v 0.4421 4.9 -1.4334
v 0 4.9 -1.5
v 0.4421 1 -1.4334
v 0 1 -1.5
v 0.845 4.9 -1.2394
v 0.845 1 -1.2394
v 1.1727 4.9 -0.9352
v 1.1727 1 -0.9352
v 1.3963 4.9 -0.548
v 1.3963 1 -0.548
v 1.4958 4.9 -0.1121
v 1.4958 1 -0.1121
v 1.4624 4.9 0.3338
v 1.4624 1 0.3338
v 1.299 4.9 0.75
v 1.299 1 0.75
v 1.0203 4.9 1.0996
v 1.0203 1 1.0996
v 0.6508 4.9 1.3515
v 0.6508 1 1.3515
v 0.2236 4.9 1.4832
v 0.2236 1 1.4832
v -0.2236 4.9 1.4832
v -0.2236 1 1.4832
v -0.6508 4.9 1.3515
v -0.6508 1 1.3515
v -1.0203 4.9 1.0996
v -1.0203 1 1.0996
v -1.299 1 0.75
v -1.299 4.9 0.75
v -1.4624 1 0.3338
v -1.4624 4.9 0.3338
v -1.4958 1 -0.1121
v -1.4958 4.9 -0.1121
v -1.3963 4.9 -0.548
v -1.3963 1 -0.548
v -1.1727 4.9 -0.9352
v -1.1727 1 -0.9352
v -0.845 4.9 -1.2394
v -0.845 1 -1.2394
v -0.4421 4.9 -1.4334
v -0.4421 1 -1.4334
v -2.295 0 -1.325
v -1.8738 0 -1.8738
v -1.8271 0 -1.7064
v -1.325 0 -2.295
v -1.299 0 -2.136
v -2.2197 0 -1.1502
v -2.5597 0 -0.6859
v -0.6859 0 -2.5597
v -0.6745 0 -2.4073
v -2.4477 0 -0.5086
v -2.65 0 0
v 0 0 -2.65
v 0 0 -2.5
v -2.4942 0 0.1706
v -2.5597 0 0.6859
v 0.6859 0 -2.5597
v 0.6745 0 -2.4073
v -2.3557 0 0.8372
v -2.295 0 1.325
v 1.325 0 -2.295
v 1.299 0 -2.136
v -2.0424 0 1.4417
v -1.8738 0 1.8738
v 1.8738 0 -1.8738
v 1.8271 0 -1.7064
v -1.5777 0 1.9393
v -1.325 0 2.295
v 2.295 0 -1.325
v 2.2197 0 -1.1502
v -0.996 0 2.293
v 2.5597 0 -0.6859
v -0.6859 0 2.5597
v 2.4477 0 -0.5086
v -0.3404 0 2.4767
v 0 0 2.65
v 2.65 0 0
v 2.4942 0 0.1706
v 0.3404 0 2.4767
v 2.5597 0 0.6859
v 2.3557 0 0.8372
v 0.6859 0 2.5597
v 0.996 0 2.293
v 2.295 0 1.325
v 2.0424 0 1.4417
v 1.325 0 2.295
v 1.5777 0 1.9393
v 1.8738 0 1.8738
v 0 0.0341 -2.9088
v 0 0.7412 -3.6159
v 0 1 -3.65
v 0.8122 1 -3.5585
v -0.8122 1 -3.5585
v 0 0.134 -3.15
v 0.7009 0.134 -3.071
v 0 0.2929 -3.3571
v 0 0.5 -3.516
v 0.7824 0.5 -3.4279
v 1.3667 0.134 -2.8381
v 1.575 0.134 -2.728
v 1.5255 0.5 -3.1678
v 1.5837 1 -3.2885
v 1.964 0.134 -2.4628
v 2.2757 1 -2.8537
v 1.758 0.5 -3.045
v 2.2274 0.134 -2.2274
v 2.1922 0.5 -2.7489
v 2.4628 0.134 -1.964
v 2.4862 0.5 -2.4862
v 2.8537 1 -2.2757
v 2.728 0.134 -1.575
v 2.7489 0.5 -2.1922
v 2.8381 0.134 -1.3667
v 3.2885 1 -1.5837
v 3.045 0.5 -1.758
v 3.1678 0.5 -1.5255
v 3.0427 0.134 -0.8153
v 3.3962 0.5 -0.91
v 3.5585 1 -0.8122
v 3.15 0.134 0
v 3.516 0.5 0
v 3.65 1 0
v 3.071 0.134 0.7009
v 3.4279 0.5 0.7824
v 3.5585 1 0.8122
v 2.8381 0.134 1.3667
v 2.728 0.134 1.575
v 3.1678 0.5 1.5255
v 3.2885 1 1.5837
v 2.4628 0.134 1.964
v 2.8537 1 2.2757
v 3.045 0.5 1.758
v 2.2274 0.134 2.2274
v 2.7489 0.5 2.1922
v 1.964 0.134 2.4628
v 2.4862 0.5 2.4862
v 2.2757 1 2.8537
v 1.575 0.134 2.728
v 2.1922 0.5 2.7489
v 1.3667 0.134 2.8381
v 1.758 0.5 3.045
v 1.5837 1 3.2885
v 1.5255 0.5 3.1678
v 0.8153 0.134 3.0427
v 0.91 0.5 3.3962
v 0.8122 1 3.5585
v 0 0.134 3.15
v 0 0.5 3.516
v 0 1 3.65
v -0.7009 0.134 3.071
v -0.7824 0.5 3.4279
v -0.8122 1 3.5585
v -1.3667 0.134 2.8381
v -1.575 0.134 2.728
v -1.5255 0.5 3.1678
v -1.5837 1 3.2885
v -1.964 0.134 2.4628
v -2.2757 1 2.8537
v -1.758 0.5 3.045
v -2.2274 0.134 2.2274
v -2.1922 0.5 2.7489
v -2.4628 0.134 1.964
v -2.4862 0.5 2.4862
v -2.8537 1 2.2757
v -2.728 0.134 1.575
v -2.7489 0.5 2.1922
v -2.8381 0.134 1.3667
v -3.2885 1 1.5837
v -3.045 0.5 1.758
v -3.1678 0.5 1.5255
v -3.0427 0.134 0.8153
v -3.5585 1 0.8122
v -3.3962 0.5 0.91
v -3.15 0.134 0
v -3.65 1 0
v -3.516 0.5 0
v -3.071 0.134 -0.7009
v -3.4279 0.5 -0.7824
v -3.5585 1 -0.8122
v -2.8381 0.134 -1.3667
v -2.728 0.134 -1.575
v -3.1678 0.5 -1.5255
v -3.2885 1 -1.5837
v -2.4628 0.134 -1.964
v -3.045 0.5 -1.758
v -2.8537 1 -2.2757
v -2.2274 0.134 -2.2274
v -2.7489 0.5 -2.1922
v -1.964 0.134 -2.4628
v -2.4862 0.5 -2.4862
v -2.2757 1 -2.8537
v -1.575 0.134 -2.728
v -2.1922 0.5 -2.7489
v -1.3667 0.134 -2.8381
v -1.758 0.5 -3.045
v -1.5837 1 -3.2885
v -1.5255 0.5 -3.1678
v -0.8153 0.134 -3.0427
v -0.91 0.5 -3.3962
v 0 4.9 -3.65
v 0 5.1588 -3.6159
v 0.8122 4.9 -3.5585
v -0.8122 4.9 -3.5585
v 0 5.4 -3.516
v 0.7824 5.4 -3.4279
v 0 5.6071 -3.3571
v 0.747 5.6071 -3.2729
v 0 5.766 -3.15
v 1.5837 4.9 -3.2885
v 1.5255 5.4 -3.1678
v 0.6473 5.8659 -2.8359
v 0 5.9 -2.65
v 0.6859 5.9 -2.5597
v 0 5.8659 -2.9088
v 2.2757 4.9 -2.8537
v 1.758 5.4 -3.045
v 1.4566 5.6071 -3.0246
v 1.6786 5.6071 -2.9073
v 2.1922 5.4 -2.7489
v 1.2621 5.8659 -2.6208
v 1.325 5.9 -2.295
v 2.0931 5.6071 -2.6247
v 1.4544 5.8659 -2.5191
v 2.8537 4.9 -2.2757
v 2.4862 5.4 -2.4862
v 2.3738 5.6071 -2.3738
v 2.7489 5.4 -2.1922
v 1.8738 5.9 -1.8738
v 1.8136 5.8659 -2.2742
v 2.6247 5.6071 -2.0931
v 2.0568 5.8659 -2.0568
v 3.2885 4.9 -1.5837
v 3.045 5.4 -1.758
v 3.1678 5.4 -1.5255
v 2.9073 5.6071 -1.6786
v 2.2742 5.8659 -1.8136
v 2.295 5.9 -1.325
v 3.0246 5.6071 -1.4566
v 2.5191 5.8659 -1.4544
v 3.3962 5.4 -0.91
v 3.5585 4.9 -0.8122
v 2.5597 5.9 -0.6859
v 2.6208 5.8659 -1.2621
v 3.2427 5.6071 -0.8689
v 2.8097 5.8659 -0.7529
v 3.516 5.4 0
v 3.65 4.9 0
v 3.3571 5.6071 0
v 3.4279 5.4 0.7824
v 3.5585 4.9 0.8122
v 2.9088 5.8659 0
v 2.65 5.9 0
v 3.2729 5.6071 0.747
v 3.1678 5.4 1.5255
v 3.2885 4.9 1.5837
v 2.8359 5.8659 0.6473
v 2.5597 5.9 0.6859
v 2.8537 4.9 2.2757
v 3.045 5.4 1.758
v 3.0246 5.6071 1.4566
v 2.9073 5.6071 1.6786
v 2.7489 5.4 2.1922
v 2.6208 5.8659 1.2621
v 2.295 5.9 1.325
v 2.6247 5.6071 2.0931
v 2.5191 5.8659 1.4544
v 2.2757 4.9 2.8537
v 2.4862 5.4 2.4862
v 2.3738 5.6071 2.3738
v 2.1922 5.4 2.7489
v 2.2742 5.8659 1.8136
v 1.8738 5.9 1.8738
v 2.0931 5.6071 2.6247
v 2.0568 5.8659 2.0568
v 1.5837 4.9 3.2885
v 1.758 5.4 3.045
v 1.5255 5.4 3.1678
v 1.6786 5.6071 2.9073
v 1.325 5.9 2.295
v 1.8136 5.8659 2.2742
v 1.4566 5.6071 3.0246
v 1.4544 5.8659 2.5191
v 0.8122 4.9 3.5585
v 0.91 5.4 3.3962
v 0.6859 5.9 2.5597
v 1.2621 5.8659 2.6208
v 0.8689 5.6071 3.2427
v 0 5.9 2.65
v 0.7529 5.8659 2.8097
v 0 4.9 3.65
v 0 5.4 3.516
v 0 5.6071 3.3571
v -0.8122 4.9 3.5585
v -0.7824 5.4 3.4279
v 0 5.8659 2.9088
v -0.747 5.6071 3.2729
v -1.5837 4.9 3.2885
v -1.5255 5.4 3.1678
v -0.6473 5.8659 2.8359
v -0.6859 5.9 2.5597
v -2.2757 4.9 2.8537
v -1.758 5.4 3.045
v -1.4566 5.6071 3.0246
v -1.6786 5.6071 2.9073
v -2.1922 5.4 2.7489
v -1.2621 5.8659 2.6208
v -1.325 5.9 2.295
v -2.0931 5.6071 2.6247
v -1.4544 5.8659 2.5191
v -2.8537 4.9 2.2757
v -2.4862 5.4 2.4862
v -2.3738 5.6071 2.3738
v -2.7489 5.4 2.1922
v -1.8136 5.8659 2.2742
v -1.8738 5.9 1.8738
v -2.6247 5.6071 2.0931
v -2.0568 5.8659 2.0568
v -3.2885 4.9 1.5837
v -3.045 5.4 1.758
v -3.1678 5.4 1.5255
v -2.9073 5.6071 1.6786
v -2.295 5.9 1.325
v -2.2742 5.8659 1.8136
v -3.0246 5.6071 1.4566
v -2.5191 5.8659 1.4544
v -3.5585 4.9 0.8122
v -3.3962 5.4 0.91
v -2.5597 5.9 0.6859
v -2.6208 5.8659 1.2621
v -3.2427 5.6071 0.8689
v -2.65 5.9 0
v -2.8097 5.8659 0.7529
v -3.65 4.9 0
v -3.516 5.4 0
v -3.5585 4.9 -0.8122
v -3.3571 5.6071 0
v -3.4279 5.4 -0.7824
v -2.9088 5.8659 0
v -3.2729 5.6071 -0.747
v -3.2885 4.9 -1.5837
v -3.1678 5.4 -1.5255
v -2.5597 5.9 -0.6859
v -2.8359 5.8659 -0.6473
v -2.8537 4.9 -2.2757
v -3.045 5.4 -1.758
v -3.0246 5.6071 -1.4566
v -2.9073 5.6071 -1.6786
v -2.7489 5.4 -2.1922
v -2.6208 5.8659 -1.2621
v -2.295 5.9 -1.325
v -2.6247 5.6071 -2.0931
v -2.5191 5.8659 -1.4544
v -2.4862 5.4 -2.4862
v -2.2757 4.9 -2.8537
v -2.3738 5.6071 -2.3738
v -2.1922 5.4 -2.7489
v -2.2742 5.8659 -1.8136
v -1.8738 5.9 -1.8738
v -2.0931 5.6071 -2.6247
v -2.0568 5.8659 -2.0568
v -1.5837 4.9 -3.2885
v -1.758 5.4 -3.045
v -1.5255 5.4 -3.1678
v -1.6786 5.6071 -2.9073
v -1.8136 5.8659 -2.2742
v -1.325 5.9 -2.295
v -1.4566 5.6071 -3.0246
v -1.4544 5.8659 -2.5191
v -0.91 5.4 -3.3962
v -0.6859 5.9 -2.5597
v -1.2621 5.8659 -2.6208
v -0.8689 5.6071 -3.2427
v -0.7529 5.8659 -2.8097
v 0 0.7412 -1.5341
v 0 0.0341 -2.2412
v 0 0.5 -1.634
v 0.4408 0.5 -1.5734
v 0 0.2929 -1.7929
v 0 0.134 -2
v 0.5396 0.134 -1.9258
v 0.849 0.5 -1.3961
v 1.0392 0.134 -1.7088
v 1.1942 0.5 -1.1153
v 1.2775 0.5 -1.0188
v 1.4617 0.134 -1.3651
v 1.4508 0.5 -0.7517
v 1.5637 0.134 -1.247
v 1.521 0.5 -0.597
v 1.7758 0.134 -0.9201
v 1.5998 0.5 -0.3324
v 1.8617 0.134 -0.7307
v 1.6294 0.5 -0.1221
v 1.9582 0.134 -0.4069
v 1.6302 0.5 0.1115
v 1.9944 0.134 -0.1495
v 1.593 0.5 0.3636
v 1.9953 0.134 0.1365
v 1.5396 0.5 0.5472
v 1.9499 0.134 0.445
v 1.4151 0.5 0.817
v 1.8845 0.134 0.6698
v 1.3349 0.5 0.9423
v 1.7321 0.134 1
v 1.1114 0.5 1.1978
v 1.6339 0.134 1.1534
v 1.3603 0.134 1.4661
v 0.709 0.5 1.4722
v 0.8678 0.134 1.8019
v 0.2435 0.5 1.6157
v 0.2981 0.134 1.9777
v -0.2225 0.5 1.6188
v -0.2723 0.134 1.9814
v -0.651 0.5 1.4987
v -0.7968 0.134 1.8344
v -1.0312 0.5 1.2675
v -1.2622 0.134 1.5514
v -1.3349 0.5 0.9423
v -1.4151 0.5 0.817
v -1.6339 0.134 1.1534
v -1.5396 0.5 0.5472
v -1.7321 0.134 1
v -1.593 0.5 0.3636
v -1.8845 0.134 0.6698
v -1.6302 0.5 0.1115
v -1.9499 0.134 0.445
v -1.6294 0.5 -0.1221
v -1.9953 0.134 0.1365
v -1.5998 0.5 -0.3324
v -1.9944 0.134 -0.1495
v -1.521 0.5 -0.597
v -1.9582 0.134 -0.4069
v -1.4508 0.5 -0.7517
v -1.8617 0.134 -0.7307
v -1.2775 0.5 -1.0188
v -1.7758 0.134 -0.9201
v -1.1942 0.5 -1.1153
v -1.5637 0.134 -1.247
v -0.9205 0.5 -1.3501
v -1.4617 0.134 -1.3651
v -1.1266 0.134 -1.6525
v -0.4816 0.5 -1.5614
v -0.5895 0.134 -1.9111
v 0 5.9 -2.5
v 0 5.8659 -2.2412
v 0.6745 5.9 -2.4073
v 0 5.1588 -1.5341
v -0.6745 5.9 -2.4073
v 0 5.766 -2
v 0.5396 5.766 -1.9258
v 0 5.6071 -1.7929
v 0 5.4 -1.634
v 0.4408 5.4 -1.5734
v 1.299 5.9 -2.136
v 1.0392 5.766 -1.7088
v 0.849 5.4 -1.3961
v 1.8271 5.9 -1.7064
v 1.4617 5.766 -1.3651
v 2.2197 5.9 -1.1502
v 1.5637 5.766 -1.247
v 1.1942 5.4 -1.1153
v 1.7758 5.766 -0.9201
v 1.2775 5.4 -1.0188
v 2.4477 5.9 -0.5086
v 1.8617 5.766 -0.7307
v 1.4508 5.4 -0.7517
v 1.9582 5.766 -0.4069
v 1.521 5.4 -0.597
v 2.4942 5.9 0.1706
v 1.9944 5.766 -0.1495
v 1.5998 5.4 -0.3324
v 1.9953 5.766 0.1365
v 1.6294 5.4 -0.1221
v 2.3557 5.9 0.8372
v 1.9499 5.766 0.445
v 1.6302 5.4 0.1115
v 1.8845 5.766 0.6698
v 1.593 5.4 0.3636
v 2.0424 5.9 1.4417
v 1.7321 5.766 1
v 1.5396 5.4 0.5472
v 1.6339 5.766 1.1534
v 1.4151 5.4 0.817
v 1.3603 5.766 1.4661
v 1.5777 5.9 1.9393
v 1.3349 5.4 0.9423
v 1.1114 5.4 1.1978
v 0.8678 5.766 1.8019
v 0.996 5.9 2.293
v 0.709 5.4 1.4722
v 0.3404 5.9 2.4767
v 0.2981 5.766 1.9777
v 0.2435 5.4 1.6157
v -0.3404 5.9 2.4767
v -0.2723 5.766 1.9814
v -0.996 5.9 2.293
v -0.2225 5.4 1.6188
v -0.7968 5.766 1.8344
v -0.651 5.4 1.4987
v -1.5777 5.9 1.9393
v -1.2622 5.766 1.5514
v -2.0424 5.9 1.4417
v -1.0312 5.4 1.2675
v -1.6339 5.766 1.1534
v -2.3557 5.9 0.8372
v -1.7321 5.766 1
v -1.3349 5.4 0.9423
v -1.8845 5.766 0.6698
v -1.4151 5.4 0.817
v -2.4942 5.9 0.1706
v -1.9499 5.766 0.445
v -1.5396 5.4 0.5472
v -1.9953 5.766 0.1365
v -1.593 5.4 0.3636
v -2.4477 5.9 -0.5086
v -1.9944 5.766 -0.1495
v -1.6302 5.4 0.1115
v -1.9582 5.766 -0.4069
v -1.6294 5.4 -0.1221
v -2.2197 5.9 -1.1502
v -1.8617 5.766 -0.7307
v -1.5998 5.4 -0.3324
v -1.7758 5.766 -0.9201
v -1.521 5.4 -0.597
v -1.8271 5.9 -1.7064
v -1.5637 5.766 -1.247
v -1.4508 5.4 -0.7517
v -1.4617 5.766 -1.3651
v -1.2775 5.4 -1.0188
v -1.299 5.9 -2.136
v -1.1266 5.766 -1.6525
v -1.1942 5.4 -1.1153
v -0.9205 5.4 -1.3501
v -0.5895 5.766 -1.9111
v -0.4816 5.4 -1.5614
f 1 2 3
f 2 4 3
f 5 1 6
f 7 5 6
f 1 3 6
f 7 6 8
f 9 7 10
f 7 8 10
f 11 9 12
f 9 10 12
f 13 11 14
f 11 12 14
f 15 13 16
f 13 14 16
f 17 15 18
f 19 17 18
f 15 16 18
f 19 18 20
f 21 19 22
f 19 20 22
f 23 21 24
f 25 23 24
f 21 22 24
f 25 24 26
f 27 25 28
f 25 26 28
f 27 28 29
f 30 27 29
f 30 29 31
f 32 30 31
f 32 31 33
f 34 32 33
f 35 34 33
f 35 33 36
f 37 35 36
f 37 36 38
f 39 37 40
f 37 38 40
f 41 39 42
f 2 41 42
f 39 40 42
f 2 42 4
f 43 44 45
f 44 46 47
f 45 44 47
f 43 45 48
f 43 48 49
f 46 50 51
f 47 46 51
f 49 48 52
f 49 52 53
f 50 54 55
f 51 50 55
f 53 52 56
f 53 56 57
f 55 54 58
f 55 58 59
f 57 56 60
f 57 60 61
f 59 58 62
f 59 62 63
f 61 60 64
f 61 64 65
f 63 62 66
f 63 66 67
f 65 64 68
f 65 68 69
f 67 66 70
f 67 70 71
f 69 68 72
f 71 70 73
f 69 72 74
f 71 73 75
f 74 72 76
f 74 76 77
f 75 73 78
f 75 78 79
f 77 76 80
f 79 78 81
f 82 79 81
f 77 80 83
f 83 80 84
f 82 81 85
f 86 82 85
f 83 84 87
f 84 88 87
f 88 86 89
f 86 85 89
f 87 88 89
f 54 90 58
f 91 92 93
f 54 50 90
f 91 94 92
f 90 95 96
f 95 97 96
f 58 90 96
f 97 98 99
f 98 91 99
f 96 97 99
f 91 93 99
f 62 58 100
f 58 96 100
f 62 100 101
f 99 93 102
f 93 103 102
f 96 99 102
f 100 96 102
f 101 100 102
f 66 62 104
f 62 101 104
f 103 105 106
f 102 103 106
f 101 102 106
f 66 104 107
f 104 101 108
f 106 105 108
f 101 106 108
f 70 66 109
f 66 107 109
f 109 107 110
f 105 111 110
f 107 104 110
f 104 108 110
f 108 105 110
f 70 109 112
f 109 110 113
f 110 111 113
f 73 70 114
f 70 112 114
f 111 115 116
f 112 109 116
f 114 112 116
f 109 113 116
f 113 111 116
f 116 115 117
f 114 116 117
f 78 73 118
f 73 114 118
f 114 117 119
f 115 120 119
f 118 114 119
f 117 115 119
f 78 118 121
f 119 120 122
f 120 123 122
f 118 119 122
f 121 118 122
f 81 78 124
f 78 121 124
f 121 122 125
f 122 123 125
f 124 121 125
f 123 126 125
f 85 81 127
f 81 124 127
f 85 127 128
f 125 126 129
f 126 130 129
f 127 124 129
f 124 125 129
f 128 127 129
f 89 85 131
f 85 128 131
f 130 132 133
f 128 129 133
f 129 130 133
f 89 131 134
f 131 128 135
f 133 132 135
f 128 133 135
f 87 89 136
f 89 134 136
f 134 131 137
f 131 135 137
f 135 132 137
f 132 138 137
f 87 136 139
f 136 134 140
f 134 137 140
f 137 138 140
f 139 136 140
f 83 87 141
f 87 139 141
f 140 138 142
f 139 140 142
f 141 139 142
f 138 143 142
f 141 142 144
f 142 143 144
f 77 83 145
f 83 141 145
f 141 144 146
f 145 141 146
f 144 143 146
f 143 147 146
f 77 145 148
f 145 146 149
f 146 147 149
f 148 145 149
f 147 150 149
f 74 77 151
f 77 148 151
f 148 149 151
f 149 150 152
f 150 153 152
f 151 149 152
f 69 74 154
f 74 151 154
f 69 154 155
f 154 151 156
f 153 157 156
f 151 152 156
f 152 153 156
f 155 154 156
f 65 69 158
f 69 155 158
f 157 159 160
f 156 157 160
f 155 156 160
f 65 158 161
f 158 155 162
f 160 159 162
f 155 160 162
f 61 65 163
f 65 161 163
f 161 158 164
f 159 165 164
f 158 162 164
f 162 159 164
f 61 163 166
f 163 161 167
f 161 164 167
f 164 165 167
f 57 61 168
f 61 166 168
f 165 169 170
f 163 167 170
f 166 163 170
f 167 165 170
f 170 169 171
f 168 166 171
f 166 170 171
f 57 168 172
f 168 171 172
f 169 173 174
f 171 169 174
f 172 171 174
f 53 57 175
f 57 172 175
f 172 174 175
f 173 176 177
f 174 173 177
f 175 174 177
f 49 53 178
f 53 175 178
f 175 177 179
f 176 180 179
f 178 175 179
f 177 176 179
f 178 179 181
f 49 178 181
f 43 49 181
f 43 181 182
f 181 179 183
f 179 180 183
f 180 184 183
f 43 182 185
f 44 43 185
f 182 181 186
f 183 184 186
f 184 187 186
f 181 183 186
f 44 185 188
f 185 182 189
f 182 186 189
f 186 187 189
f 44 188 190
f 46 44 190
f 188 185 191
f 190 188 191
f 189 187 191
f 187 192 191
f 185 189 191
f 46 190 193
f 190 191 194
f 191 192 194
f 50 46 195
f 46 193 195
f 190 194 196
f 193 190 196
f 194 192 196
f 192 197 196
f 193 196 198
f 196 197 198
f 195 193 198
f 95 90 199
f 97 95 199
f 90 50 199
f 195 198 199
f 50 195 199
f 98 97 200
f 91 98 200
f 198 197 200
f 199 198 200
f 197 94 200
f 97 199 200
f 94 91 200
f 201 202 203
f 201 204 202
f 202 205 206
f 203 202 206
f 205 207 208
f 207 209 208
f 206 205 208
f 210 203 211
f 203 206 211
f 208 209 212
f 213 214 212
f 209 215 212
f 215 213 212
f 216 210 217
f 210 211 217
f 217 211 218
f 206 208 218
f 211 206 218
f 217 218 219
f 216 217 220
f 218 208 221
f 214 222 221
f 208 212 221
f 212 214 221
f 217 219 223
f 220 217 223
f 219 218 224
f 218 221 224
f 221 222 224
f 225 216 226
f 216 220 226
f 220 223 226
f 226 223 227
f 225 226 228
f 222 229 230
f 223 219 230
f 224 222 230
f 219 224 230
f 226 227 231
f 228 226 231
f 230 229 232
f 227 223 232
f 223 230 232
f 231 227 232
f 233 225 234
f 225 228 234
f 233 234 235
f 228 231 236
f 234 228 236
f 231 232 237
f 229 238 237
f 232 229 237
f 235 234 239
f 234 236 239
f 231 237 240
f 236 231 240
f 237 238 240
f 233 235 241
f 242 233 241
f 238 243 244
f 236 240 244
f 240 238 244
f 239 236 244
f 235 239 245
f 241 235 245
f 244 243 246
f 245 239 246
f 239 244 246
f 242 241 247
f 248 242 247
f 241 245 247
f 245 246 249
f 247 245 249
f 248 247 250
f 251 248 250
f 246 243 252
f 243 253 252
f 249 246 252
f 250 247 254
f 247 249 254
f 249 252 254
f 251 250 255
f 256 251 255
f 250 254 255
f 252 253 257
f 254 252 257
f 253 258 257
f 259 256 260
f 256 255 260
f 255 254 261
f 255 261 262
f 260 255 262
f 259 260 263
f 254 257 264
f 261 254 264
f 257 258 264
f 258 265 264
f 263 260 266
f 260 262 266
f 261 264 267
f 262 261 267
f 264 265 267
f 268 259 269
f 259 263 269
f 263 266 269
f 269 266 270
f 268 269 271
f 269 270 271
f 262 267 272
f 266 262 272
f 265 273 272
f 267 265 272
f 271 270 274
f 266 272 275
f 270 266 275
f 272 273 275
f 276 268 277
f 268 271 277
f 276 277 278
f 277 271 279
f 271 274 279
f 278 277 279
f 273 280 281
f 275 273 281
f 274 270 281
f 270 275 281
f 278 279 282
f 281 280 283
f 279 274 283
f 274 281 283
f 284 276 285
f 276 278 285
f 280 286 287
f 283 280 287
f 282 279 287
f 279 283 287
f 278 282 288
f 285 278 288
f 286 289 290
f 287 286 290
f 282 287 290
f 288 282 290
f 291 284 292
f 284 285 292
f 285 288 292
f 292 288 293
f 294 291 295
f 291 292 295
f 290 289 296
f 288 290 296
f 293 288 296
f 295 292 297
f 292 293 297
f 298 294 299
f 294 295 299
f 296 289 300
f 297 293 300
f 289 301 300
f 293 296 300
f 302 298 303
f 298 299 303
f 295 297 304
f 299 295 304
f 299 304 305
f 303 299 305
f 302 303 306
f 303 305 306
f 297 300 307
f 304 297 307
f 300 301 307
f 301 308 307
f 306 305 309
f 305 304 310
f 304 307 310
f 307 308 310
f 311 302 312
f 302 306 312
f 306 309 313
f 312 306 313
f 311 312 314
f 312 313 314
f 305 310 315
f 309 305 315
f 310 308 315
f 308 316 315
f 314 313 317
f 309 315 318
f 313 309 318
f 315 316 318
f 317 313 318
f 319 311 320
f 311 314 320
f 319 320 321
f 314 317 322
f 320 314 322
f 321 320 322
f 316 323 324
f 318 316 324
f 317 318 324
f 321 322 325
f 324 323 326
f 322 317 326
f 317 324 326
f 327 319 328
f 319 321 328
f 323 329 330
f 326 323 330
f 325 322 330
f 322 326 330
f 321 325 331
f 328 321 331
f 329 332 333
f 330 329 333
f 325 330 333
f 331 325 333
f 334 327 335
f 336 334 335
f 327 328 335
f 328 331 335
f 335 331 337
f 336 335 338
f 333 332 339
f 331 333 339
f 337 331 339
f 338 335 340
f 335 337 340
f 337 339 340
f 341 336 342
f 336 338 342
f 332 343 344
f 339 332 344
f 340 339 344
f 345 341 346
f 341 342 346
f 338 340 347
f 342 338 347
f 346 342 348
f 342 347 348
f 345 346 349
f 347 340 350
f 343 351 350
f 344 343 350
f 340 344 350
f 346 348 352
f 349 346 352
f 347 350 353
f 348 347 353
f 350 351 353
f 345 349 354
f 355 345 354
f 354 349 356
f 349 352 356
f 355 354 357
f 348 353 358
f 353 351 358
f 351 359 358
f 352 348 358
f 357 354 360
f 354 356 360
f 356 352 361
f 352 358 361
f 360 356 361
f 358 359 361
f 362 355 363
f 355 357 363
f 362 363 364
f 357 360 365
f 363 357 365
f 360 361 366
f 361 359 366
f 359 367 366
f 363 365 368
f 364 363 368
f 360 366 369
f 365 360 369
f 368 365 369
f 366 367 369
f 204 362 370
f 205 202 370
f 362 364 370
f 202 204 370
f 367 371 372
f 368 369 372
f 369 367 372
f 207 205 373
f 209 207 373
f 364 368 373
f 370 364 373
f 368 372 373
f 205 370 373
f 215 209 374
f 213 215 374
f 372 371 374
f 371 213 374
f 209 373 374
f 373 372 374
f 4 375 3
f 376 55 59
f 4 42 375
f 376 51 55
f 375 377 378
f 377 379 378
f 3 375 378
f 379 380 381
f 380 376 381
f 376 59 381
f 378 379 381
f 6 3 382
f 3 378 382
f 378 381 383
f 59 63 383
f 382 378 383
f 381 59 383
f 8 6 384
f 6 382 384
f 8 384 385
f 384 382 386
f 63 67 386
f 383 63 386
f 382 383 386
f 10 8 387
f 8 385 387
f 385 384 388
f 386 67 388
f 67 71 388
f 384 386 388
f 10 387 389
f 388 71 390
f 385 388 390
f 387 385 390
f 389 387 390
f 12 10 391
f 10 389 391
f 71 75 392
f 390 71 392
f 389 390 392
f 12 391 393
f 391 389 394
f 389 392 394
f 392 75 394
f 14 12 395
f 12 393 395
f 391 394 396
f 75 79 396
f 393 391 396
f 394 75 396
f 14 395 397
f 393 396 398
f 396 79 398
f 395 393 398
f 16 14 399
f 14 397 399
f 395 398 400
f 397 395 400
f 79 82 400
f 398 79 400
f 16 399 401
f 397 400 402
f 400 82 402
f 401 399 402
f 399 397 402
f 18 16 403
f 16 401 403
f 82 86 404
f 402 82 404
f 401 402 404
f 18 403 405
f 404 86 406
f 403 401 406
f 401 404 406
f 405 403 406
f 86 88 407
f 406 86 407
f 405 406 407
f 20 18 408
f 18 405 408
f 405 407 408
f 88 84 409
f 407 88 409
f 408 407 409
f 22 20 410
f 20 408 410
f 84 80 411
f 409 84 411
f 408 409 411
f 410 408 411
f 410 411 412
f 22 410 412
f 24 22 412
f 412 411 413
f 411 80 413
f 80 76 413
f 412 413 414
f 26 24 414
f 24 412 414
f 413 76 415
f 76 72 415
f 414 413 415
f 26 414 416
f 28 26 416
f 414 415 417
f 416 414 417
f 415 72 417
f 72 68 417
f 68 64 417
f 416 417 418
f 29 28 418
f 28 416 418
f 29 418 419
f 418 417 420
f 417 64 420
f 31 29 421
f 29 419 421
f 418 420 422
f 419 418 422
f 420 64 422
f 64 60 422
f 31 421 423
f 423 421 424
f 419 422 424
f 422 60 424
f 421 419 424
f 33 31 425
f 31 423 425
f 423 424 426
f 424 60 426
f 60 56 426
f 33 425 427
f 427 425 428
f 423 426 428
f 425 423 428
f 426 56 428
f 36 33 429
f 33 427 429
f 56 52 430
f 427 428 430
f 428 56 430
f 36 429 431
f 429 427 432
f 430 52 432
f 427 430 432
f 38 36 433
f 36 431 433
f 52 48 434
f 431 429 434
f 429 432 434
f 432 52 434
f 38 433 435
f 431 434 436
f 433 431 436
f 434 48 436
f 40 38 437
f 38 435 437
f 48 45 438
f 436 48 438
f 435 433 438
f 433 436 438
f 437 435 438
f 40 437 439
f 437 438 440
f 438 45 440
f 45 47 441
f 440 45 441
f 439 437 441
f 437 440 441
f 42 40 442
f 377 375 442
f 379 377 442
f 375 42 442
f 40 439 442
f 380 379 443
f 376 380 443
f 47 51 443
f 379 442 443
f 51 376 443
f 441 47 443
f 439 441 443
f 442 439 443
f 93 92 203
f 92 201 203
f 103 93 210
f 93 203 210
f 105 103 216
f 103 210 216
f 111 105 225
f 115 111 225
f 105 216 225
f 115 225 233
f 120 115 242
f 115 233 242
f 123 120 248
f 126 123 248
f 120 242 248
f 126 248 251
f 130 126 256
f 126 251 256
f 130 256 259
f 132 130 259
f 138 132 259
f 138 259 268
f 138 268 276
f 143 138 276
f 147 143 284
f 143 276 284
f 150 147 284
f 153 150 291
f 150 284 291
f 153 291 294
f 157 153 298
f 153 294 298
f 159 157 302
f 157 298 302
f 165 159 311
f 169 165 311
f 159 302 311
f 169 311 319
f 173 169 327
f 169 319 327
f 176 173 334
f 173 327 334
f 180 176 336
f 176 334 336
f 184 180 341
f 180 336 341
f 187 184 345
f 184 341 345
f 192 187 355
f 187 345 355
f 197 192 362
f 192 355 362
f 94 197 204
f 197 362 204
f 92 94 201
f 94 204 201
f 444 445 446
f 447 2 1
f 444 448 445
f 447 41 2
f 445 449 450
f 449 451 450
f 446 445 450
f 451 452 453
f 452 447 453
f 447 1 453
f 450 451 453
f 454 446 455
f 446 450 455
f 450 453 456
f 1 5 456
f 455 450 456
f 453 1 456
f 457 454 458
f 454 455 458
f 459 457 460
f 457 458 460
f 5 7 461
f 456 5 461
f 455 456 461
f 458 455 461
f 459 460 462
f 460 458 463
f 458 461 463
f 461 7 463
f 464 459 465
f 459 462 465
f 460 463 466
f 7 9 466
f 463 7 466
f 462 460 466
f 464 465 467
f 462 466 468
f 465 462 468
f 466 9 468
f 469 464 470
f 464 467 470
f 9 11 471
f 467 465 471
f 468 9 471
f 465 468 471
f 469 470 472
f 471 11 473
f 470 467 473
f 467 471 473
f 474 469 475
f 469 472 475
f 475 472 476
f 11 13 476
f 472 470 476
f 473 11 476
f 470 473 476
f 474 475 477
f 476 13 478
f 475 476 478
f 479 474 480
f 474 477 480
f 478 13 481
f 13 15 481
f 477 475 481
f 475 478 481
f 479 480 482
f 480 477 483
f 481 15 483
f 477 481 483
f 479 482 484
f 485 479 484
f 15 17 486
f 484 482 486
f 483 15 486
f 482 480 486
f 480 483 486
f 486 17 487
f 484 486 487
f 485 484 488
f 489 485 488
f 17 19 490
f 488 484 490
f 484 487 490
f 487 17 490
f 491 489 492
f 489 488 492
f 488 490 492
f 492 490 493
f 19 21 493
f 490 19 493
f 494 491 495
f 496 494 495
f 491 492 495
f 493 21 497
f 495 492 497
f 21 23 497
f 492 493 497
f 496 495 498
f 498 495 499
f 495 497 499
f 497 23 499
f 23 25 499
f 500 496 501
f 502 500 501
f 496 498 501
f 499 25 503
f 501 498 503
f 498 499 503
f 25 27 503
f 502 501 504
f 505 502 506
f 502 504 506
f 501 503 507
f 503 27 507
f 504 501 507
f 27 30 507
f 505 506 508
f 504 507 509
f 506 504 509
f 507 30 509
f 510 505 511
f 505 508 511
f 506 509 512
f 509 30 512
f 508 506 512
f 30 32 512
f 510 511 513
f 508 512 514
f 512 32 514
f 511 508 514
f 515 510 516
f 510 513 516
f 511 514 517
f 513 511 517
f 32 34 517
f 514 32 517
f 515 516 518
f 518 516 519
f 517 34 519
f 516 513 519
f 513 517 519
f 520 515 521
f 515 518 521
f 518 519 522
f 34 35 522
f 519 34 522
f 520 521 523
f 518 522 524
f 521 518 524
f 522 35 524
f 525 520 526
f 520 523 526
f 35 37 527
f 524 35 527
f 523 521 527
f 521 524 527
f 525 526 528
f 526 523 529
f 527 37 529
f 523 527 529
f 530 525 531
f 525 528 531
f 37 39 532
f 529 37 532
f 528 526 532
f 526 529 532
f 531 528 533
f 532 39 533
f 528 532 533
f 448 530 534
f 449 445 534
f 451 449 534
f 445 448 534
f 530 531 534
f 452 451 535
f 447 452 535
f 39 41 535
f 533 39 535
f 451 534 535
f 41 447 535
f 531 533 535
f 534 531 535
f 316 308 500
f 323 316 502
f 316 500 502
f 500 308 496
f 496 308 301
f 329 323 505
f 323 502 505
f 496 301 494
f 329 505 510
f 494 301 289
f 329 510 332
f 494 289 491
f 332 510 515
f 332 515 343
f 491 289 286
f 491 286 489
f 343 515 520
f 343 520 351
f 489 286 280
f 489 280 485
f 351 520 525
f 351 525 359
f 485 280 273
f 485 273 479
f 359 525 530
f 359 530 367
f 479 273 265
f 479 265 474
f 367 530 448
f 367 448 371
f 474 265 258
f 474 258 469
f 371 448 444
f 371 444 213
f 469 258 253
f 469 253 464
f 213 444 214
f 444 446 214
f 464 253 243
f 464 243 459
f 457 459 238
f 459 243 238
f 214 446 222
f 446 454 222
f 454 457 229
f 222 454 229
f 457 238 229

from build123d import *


with BuildPart() as part:
    # Sketch1 → Revolve1 (revolve)
    with BuildSketch(Plane.XY, mode=Mode.PRIVATE) as revolve1_sk:
        with BuildLine():
            Line((1.5, 4.9), (1.5, 1))
            ThreePointArc((1.5, 1), (1.792893219, 0.292893219), (2.5, 0))
            Line((2.5, 0), (2.65, 0))
            ThreePointArc((2.65, 0), (3.357106781, 0.292893219), (3.65, 1))
            Line((3.65, 1), (3.65, 4.9))
            ThreePointArc((3.65, 4.9), (3.357106781, 5.607106781), (2.65, 5.9))
            Line((2.65, 5.9), (2.5, 5.9))
            ThreePointArc((2.5, 5.9), (1.792893219, 5.607106781), (1.5, 4.9))
        make_face()
    revolve(revolve1_sk.sketch.rotate(Axis((0, 5.902912508, 0), (0, -1, 0)), 270), axis=Axis((0, 5.902912508, 0), (0, -1, 0)))


solid = part.part
